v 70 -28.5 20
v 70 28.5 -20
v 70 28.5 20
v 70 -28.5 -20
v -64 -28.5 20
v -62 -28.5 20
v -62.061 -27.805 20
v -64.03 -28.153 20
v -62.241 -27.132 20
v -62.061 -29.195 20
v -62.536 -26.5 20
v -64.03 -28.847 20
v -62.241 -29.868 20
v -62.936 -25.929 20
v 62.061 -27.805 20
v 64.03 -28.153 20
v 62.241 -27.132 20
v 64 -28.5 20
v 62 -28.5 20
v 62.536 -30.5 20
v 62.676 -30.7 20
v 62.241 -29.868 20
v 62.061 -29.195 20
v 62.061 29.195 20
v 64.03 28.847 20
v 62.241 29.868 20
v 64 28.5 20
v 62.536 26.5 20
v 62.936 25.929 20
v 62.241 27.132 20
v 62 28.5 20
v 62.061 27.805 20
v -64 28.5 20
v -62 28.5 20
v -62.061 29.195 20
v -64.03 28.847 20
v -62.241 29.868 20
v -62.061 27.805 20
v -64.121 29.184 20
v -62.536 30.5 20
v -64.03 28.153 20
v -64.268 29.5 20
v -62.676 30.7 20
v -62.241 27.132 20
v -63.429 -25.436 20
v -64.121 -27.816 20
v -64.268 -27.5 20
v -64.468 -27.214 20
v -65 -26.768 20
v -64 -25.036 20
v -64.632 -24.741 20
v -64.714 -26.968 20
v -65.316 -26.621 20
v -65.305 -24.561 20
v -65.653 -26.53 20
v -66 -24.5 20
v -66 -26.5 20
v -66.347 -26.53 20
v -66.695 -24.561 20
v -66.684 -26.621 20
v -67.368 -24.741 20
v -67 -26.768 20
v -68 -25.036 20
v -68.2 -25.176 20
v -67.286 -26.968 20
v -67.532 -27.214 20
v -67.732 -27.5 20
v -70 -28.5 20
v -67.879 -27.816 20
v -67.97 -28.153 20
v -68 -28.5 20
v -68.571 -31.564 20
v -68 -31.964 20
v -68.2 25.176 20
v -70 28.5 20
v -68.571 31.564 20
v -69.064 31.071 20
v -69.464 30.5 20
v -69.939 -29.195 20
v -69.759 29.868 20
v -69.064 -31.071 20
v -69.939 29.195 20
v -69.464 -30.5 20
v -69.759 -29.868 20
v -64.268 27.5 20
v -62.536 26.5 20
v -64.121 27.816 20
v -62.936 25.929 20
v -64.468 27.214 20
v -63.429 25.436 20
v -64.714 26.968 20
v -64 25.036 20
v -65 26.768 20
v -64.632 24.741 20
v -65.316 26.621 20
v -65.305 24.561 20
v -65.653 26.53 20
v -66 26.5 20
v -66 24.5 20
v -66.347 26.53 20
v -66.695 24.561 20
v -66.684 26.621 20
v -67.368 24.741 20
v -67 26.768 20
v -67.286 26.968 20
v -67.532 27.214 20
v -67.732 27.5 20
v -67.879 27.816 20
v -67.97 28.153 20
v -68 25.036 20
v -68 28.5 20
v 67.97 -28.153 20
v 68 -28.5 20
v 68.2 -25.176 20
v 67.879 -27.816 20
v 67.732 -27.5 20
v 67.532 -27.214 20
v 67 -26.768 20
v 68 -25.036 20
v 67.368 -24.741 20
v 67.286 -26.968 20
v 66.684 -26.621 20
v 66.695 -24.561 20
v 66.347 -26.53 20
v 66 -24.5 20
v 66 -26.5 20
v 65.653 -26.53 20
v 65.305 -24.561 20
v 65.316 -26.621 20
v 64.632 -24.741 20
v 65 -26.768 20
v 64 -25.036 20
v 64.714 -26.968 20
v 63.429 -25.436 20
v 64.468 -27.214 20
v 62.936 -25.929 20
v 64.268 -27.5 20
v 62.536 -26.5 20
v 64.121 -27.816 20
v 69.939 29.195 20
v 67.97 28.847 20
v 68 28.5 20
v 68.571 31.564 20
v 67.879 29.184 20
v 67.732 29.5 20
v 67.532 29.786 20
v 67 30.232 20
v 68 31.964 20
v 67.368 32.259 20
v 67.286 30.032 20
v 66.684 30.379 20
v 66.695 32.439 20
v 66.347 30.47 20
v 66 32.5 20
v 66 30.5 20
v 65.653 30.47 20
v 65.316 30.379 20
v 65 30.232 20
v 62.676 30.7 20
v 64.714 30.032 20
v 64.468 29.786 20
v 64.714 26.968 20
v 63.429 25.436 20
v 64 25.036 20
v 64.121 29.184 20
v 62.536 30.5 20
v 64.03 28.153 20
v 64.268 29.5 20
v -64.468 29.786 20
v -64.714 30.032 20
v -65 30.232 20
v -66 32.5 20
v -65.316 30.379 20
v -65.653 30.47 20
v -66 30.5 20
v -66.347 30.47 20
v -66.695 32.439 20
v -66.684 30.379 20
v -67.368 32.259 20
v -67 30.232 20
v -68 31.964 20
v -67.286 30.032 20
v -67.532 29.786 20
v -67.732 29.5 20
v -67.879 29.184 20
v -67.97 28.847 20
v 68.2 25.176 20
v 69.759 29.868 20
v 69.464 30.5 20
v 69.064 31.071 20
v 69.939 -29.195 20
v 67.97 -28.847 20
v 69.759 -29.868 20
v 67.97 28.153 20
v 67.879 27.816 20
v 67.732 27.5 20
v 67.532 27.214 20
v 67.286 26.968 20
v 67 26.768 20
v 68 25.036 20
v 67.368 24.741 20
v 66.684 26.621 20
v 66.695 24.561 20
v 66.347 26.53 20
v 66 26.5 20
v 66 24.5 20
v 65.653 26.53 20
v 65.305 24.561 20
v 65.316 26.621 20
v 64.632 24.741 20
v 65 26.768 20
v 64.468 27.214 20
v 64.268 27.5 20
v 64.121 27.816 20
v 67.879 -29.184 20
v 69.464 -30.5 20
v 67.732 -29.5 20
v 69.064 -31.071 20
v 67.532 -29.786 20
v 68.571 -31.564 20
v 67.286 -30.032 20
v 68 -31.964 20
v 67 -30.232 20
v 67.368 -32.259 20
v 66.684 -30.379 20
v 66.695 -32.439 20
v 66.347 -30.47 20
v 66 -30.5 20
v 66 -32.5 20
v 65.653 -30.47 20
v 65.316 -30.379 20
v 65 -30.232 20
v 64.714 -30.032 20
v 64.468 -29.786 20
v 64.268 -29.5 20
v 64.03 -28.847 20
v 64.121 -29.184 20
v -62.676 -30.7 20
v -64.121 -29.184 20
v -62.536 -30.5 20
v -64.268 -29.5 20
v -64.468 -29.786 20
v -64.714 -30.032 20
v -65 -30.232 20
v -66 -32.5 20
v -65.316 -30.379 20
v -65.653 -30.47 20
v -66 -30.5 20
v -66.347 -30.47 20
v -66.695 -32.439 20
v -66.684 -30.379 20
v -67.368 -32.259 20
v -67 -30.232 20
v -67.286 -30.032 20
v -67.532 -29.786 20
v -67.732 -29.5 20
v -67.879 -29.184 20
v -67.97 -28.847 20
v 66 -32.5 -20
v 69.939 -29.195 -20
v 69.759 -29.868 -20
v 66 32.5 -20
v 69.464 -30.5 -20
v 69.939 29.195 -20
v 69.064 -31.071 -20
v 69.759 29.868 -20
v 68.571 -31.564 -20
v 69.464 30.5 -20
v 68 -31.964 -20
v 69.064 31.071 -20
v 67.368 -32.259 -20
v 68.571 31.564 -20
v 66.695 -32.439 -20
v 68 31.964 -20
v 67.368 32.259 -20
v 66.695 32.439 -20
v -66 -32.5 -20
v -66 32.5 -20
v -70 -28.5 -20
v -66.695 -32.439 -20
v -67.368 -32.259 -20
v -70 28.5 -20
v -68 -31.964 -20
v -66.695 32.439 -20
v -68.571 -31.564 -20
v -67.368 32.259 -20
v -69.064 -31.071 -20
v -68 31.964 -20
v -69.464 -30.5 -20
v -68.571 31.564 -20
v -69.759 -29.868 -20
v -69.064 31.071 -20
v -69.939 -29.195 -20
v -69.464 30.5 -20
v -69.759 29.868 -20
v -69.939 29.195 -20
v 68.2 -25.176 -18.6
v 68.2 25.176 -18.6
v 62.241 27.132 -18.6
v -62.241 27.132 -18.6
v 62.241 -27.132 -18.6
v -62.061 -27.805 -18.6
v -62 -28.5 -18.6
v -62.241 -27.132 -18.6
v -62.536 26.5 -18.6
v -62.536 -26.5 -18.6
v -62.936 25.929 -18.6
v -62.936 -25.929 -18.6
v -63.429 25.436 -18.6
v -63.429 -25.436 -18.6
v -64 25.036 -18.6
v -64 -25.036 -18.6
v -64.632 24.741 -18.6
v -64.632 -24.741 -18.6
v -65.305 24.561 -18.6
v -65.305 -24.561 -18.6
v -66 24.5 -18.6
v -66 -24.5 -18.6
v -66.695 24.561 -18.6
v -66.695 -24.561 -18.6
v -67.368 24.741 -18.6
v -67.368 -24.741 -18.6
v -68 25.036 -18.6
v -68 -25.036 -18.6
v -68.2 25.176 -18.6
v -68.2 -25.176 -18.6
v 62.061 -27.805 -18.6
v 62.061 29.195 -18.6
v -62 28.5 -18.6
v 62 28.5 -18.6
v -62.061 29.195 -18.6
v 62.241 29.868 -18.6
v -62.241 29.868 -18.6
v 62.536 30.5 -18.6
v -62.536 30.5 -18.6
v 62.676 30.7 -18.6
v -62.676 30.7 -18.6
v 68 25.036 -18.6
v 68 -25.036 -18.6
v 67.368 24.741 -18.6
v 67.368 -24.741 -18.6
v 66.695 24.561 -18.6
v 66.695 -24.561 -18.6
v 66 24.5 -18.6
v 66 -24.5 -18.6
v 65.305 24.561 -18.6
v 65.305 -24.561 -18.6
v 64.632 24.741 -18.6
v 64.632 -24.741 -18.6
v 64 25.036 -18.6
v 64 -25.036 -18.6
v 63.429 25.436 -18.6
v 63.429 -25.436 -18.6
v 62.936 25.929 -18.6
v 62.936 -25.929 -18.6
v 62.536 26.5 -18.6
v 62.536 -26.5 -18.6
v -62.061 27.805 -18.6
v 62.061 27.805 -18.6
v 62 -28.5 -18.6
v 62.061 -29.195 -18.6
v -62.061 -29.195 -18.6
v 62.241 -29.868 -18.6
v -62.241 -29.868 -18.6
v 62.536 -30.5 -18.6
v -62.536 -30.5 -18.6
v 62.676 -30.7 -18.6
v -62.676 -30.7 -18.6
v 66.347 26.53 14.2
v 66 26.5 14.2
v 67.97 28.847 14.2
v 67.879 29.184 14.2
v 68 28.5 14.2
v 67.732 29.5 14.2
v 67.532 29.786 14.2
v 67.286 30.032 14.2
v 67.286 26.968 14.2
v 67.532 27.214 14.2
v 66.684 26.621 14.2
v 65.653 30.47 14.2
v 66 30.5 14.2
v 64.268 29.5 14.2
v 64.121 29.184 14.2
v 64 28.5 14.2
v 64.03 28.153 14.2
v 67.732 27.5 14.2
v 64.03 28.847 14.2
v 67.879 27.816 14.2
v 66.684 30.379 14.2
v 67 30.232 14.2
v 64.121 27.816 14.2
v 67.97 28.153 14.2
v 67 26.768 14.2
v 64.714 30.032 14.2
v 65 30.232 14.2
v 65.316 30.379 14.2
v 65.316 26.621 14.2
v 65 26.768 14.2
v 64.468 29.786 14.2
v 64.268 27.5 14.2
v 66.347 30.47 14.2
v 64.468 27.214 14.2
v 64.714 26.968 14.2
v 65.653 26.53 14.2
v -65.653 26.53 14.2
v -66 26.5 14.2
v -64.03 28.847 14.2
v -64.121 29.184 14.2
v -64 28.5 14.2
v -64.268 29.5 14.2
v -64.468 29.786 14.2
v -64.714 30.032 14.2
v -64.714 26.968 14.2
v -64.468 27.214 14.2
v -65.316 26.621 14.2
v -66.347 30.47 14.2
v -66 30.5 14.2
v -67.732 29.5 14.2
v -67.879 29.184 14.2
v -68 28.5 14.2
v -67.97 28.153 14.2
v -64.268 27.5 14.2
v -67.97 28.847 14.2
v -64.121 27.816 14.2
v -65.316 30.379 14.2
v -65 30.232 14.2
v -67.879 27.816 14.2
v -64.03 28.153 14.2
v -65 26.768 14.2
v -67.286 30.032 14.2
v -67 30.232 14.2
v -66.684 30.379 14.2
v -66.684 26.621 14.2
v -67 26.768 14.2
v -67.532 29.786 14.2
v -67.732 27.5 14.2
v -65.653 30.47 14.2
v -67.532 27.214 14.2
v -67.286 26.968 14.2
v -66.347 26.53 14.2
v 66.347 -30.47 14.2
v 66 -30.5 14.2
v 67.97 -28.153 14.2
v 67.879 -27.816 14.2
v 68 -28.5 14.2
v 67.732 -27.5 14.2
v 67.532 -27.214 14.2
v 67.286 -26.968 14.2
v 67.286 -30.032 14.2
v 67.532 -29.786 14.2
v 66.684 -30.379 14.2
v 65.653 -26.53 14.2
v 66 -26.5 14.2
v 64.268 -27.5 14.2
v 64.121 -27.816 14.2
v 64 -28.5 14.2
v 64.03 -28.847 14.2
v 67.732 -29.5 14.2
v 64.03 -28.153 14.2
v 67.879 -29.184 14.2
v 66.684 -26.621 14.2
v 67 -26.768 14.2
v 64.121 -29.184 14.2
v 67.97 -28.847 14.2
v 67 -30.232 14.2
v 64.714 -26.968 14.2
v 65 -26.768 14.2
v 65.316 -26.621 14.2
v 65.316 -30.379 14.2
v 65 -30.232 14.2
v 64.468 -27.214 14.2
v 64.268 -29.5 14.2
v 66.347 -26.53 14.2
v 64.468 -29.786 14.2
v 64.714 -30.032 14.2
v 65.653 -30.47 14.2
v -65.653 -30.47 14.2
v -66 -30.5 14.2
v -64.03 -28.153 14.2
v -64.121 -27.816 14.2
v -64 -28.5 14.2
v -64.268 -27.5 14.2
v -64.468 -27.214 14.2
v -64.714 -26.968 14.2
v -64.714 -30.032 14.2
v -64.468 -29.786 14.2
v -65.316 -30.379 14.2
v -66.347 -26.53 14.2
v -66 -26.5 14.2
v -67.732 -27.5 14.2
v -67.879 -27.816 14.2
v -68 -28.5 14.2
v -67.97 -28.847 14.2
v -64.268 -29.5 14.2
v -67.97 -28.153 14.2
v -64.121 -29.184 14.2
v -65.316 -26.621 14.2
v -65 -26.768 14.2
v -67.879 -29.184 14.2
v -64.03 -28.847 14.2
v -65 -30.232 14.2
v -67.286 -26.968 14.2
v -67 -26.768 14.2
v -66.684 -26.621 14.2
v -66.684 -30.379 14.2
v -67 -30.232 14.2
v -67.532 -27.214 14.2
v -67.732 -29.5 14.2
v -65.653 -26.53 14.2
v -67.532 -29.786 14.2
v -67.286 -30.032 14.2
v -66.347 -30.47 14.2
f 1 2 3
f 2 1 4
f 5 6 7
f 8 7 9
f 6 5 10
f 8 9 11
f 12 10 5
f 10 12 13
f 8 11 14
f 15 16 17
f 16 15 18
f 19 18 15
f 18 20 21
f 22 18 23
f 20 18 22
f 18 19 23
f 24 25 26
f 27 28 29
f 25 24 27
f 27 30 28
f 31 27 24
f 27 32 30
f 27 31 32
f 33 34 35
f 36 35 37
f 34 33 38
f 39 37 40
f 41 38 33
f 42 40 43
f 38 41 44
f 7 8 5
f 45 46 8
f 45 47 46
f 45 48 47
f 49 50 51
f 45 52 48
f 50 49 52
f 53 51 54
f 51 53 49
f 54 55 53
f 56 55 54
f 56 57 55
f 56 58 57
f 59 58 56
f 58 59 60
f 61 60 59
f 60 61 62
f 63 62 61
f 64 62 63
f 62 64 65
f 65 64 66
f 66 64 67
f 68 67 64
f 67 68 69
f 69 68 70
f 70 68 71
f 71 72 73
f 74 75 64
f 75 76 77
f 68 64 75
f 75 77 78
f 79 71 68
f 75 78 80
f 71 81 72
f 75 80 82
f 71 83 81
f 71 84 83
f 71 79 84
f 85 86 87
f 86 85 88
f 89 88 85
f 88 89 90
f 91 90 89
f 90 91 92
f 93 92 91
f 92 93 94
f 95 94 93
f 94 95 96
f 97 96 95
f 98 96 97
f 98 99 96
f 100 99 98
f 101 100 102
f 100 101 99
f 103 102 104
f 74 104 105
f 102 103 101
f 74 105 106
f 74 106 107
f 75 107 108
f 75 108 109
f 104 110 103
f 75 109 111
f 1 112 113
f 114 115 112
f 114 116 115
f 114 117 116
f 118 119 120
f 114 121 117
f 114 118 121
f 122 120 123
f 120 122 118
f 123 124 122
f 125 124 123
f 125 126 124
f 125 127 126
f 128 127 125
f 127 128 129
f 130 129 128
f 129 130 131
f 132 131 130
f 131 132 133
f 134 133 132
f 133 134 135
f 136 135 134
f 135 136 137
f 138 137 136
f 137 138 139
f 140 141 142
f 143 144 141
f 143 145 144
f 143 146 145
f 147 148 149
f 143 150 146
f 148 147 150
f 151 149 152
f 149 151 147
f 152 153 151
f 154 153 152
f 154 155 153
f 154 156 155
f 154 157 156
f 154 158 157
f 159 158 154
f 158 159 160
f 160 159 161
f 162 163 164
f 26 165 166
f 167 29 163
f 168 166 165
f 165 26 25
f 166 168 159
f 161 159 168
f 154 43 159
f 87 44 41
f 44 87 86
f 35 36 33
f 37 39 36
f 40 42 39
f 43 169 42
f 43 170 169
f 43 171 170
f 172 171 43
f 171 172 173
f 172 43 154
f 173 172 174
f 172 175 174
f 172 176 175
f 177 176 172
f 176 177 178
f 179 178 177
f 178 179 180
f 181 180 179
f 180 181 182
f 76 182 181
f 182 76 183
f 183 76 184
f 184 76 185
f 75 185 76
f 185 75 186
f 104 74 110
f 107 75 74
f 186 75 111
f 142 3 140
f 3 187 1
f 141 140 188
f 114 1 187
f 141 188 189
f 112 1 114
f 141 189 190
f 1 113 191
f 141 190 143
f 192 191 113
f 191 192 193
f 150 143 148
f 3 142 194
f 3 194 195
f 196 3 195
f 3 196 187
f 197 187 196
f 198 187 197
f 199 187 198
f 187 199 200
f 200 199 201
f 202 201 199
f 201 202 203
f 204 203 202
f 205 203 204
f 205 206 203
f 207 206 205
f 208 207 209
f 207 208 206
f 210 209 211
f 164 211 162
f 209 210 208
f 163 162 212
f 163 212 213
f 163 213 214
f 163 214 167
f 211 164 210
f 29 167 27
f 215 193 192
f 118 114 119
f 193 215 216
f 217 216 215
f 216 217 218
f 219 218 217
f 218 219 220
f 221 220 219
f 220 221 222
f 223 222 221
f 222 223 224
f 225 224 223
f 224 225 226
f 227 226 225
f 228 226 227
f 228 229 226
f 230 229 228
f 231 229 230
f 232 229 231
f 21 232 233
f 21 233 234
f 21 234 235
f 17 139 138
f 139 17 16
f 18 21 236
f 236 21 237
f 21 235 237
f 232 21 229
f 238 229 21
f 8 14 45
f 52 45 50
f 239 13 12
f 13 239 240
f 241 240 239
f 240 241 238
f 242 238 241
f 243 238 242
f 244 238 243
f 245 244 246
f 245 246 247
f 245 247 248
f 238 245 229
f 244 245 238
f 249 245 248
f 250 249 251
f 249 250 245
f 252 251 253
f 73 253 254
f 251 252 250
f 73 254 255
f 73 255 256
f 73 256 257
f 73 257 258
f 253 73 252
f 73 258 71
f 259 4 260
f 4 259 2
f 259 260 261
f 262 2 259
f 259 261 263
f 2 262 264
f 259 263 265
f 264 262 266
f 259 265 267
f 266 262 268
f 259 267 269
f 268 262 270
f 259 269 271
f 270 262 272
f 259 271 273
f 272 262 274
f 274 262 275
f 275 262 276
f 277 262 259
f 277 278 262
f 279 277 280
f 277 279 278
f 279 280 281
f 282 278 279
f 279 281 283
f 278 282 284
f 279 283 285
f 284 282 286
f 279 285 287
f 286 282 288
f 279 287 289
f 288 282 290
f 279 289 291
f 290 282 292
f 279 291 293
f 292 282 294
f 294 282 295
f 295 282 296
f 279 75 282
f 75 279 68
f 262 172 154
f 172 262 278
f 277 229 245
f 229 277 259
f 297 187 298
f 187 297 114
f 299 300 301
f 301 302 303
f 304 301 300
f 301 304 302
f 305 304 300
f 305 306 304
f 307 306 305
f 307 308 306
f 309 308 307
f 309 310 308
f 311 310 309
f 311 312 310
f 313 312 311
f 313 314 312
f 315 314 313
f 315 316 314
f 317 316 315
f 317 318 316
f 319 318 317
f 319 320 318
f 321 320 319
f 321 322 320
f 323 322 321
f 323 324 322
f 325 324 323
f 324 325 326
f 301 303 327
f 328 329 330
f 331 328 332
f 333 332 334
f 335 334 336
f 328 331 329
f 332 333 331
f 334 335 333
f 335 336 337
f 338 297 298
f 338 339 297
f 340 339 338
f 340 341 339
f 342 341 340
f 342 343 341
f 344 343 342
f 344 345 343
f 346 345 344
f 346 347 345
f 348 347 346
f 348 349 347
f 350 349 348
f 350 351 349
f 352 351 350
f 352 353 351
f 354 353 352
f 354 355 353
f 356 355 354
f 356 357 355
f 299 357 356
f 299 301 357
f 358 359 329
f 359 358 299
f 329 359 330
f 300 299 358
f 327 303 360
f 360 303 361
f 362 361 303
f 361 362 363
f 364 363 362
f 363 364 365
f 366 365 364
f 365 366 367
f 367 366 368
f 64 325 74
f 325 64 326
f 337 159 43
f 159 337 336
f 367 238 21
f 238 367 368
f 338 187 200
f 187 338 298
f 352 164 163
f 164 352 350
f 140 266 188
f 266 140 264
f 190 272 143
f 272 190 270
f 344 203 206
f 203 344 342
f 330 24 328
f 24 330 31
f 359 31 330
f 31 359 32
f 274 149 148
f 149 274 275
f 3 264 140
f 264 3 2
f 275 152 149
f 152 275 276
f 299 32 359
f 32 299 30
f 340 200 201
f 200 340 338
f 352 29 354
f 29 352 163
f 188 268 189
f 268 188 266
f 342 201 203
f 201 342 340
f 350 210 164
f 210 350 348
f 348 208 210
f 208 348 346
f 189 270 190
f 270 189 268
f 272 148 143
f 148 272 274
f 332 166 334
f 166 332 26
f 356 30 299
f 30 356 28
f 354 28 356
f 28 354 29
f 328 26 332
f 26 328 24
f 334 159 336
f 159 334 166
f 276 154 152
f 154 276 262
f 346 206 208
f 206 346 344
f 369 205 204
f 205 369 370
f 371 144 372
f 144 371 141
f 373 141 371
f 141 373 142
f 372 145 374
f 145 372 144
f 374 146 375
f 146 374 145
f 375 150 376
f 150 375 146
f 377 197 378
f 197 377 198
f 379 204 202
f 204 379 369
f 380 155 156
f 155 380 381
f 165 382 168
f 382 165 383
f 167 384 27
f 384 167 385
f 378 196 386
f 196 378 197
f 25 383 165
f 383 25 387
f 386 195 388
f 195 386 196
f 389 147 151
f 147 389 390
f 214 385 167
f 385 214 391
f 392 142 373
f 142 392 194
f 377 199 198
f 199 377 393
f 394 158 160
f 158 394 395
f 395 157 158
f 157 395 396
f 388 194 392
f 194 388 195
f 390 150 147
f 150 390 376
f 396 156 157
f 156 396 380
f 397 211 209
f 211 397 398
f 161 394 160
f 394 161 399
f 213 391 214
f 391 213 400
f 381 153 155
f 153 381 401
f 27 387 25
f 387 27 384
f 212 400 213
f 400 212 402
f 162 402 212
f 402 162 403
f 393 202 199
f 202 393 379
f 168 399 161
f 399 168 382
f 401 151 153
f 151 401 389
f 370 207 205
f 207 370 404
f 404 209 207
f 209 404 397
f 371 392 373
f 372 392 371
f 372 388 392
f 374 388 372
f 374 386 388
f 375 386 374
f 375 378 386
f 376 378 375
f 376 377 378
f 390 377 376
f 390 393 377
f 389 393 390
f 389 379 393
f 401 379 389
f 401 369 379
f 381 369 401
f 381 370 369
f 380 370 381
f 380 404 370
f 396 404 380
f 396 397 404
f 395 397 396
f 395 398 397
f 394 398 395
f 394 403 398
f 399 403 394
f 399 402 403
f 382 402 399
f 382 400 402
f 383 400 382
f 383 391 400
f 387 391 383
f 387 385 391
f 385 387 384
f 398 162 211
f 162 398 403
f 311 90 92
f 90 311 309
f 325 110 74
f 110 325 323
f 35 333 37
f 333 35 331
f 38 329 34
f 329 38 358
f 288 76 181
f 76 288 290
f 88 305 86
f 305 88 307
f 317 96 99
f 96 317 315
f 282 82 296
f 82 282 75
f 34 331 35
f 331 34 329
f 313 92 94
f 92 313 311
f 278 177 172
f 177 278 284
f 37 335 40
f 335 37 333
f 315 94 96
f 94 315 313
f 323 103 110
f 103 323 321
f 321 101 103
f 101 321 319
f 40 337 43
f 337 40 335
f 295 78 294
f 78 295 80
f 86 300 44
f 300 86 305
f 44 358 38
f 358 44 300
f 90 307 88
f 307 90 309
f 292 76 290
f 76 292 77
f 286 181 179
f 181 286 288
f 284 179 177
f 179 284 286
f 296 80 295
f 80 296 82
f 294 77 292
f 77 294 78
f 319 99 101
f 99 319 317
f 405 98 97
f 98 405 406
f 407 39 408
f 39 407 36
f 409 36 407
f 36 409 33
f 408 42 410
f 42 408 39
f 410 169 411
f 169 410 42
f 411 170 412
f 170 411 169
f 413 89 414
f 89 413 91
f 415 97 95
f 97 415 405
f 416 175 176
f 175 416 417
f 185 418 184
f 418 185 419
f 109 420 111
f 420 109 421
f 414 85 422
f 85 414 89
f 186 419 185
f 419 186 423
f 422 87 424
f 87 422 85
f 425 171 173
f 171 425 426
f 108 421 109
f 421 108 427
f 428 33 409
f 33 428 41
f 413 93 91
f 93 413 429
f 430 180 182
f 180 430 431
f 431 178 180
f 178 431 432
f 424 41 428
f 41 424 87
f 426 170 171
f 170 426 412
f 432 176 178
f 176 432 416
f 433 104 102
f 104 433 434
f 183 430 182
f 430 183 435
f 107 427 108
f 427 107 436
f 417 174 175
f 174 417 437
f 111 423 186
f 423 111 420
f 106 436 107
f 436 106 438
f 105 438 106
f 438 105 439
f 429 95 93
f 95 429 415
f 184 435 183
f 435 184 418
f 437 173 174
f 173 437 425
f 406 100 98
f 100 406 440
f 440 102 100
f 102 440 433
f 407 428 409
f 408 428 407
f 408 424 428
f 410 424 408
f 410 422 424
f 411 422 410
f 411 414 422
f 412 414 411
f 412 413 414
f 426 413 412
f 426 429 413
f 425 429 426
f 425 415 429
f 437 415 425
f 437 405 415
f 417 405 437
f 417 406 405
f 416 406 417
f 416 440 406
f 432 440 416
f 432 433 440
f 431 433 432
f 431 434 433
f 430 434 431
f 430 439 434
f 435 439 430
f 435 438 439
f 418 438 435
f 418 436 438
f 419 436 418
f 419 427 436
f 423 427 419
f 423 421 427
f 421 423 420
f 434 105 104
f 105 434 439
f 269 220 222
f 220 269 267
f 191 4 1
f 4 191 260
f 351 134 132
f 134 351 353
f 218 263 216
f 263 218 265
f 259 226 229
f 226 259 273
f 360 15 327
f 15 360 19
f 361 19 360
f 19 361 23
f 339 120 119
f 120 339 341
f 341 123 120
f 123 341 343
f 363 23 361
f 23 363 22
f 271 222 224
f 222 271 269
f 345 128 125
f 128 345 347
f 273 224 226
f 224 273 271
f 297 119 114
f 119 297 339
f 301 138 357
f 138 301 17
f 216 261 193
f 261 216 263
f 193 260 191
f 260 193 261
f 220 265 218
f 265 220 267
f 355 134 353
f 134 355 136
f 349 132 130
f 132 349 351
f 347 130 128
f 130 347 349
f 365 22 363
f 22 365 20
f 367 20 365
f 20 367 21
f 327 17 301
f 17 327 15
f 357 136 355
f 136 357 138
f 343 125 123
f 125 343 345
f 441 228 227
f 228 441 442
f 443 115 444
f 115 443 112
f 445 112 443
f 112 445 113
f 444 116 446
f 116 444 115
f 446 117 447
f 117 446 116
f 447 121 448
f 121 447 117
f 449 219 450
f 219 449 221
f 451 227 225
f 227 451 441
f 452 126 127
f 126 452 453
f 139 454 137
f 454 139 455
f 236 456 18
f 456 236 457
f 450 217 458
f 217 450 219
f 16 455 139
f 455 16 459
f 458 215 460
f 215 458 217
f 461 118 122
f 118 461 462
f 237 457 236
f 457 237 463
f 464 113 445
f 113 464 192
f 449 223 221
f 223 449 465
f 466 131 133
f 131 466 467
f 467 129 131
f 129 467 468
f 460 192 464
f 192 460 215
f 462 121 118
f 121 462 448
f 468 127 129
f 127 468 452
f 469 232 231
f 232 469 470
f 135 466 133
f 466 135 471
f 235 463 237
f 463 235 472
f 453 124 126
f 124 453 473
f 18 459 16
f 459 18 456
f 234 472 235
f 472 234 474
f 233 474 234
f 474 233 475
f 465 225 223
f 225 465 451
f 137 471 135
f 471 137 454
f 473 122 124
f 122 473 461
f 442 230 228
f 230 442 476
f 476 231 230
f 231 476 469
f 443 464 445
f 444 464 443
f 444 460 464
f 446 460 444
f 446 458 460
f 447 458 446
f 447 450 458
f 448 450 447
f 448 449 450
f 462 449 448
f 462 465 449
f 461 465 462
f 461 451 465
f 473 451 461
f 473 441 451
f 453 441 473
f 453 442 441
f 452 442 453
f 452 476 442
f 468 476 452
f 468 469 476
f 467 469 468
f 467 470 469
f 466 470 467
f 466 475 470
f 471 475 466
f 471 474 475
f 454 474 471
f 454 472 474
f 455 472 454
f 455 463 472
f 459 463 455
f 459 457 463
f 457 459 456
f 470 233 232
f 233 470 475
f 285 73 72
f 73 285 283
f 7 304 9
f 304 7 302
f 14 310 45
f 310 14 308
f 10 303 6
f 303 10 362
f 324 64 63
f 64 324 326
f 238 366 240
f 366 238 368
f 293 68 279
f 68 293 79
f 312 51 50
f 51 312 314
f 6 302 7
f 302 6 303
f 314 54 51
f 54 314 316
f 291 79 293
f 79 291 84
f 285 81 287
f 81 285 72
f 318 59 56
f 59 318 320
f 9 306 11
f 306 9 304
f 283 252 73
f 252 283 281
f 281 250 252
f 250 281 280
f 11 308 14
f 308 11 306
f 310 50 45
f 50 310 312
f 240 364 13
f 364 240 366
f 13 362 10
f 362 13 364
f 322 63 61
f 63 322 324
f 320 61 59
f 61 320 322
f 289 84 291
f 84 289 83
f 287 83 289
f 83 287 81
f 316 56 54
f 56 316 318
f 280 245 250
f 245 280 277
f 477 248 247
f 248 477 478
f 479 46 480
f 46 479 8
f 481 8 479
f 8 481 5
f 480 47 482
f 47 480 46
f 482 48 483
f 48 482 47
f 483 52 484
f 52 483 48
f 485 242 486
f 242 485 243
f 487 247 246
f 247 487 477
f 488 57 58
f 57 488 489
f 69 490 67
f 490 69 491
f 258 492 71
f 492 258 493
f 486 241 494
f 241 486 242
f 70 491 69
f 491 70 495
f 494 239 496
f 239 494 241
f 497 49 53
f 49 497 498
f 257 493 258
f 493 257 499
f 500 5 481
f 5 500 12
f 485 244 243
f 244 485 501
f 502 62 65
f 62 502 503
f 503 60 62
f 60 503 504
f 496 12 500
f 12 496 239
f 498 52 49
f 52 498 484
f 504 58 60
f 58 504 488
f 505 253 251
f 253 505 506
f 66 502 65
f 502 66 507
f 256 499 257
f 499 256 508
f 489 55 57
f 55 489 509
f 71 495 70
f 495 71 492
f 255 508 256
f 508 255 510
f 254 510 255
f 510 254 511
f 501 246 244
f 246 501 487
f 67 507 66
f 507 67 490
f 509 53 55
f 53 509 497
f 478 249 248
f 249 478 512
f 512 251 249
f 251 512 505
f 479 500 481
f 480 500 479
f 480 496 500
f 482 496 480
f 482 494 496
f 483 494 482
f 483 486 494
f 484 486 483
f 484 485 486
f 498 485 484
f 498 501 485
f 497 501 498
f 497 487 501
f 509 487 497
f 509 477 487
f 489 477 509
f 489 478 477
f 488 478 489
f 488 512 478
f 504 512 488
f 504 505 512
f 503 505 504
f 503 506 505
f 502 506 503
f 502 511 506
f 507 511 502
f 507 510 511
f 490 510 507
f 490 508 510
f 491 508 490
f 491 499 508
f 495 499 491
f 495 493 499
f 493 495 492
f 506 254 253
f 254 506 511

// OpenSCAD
// Definition size of housing
// **************************

       // Those settings have to be identical to the cover !!!
width_x      = 140;          // Width of the housing (outer dimension) 
debth_y      = 65;           // Debth of the housing (outer dimension)
wall         = 1.8;          // Wall thickness of the box
cornerradius = 4.0;          // Radius of the corners
                             //   This value also defines the posts for stability and
                             //   for the press-in nuts!

       // Those settings are more or less independent from the cover
height_z     = 40;           // Heigth of the lower part. Total height is this value plus
                             //   the height of the cover
plate        = 1.4;          // Thickness of the bottom plain

       //Definition size of press-in nuts
nutdiameter  = 4.0;          // Hole diameter for thermal press-in nut
nutlength    = 5.8;          // Depth of the nut hole


//Definition of circle angular resolution
resol        = 36;



difference () {

// Construction of housing
   union () {
   // Definition of main body
      difference () {
         union () {
            cube ( [width_x, debth_y - (2* cornerradius), height_z], center = true );
            cube ( [width_x - (2* cornerradius), debth_y, height_z], center = true );
         };
         translate ( [0,0, plate / 2] ){
            cube ( [width_x - (2* wall), debth_y- (2* wall), height_z - plate], center = true ); 
         };
      };

      // Construction of four corner cylinders including nut holes
      // 1st quadrant
      translate ( [(width_x / 2) - cornerradius, (debth_y / 2) - cornerradius, 0 ] ) {
         difference () {
            cylinder (h=height_z, r=cornerradius, center = true, $fn = resol);
            translate ( [ 0,0,(height_z / 2)-(nutlength / 2) ] ) {
               cylinder (h = nutlength, r = nutdiameter / 2, center = true, $fn = resol);
            };
         };
      };

      // 2nd quadrant
      translate ( [-(width_x / 2) + cornerradius, (debth_y / 2) - cornerradius, 0] ) {
         difference () {
            cylinder (h=height_z, r=cornerradius, center = true, $fn = resol);
            translate ( [ 0,0,(height_z / 2)-(nutlength / 2) ] ) {
               cylinder (h = nutlength, r = nutdiameter / 2, center = true, $fn = resol);
            };
         };
      };

      // 4th quadrant
      translate ( [(width_x / 2) - cornerradius, -(debth_y / 2) + cornerradius, 0] ) {
         difference () {
            cylinder (h=height_z, r=cornerradius, center = true, $fn = resol);
            translate ( [ 0,0,(height_z / 2)-(nutlength / 2) ] ) {
               cylinder (h = nutlength, r = nutdiameter / 2, center = true, $fn = resol);
            };
         };
      };

      // 3rd quadrant
      translate ( [-(width_x / 2) + cornerradius, -(debth_y / 2) + cornerradius, 0] ) {
         difference () {
            cylinder (h=height_z, r=cornerradius, center = true, $fn = resol);
            translate ( [ 0,0,(height_z / 2)-(nutlength / 2) ] ) {
               cylinder (h = nutlength, r = nutdiameter / 2, center = true, $fn = resol);
            };
         };
      }; 
   };

// Space for the construction of holes, breakouts, ... 


};
